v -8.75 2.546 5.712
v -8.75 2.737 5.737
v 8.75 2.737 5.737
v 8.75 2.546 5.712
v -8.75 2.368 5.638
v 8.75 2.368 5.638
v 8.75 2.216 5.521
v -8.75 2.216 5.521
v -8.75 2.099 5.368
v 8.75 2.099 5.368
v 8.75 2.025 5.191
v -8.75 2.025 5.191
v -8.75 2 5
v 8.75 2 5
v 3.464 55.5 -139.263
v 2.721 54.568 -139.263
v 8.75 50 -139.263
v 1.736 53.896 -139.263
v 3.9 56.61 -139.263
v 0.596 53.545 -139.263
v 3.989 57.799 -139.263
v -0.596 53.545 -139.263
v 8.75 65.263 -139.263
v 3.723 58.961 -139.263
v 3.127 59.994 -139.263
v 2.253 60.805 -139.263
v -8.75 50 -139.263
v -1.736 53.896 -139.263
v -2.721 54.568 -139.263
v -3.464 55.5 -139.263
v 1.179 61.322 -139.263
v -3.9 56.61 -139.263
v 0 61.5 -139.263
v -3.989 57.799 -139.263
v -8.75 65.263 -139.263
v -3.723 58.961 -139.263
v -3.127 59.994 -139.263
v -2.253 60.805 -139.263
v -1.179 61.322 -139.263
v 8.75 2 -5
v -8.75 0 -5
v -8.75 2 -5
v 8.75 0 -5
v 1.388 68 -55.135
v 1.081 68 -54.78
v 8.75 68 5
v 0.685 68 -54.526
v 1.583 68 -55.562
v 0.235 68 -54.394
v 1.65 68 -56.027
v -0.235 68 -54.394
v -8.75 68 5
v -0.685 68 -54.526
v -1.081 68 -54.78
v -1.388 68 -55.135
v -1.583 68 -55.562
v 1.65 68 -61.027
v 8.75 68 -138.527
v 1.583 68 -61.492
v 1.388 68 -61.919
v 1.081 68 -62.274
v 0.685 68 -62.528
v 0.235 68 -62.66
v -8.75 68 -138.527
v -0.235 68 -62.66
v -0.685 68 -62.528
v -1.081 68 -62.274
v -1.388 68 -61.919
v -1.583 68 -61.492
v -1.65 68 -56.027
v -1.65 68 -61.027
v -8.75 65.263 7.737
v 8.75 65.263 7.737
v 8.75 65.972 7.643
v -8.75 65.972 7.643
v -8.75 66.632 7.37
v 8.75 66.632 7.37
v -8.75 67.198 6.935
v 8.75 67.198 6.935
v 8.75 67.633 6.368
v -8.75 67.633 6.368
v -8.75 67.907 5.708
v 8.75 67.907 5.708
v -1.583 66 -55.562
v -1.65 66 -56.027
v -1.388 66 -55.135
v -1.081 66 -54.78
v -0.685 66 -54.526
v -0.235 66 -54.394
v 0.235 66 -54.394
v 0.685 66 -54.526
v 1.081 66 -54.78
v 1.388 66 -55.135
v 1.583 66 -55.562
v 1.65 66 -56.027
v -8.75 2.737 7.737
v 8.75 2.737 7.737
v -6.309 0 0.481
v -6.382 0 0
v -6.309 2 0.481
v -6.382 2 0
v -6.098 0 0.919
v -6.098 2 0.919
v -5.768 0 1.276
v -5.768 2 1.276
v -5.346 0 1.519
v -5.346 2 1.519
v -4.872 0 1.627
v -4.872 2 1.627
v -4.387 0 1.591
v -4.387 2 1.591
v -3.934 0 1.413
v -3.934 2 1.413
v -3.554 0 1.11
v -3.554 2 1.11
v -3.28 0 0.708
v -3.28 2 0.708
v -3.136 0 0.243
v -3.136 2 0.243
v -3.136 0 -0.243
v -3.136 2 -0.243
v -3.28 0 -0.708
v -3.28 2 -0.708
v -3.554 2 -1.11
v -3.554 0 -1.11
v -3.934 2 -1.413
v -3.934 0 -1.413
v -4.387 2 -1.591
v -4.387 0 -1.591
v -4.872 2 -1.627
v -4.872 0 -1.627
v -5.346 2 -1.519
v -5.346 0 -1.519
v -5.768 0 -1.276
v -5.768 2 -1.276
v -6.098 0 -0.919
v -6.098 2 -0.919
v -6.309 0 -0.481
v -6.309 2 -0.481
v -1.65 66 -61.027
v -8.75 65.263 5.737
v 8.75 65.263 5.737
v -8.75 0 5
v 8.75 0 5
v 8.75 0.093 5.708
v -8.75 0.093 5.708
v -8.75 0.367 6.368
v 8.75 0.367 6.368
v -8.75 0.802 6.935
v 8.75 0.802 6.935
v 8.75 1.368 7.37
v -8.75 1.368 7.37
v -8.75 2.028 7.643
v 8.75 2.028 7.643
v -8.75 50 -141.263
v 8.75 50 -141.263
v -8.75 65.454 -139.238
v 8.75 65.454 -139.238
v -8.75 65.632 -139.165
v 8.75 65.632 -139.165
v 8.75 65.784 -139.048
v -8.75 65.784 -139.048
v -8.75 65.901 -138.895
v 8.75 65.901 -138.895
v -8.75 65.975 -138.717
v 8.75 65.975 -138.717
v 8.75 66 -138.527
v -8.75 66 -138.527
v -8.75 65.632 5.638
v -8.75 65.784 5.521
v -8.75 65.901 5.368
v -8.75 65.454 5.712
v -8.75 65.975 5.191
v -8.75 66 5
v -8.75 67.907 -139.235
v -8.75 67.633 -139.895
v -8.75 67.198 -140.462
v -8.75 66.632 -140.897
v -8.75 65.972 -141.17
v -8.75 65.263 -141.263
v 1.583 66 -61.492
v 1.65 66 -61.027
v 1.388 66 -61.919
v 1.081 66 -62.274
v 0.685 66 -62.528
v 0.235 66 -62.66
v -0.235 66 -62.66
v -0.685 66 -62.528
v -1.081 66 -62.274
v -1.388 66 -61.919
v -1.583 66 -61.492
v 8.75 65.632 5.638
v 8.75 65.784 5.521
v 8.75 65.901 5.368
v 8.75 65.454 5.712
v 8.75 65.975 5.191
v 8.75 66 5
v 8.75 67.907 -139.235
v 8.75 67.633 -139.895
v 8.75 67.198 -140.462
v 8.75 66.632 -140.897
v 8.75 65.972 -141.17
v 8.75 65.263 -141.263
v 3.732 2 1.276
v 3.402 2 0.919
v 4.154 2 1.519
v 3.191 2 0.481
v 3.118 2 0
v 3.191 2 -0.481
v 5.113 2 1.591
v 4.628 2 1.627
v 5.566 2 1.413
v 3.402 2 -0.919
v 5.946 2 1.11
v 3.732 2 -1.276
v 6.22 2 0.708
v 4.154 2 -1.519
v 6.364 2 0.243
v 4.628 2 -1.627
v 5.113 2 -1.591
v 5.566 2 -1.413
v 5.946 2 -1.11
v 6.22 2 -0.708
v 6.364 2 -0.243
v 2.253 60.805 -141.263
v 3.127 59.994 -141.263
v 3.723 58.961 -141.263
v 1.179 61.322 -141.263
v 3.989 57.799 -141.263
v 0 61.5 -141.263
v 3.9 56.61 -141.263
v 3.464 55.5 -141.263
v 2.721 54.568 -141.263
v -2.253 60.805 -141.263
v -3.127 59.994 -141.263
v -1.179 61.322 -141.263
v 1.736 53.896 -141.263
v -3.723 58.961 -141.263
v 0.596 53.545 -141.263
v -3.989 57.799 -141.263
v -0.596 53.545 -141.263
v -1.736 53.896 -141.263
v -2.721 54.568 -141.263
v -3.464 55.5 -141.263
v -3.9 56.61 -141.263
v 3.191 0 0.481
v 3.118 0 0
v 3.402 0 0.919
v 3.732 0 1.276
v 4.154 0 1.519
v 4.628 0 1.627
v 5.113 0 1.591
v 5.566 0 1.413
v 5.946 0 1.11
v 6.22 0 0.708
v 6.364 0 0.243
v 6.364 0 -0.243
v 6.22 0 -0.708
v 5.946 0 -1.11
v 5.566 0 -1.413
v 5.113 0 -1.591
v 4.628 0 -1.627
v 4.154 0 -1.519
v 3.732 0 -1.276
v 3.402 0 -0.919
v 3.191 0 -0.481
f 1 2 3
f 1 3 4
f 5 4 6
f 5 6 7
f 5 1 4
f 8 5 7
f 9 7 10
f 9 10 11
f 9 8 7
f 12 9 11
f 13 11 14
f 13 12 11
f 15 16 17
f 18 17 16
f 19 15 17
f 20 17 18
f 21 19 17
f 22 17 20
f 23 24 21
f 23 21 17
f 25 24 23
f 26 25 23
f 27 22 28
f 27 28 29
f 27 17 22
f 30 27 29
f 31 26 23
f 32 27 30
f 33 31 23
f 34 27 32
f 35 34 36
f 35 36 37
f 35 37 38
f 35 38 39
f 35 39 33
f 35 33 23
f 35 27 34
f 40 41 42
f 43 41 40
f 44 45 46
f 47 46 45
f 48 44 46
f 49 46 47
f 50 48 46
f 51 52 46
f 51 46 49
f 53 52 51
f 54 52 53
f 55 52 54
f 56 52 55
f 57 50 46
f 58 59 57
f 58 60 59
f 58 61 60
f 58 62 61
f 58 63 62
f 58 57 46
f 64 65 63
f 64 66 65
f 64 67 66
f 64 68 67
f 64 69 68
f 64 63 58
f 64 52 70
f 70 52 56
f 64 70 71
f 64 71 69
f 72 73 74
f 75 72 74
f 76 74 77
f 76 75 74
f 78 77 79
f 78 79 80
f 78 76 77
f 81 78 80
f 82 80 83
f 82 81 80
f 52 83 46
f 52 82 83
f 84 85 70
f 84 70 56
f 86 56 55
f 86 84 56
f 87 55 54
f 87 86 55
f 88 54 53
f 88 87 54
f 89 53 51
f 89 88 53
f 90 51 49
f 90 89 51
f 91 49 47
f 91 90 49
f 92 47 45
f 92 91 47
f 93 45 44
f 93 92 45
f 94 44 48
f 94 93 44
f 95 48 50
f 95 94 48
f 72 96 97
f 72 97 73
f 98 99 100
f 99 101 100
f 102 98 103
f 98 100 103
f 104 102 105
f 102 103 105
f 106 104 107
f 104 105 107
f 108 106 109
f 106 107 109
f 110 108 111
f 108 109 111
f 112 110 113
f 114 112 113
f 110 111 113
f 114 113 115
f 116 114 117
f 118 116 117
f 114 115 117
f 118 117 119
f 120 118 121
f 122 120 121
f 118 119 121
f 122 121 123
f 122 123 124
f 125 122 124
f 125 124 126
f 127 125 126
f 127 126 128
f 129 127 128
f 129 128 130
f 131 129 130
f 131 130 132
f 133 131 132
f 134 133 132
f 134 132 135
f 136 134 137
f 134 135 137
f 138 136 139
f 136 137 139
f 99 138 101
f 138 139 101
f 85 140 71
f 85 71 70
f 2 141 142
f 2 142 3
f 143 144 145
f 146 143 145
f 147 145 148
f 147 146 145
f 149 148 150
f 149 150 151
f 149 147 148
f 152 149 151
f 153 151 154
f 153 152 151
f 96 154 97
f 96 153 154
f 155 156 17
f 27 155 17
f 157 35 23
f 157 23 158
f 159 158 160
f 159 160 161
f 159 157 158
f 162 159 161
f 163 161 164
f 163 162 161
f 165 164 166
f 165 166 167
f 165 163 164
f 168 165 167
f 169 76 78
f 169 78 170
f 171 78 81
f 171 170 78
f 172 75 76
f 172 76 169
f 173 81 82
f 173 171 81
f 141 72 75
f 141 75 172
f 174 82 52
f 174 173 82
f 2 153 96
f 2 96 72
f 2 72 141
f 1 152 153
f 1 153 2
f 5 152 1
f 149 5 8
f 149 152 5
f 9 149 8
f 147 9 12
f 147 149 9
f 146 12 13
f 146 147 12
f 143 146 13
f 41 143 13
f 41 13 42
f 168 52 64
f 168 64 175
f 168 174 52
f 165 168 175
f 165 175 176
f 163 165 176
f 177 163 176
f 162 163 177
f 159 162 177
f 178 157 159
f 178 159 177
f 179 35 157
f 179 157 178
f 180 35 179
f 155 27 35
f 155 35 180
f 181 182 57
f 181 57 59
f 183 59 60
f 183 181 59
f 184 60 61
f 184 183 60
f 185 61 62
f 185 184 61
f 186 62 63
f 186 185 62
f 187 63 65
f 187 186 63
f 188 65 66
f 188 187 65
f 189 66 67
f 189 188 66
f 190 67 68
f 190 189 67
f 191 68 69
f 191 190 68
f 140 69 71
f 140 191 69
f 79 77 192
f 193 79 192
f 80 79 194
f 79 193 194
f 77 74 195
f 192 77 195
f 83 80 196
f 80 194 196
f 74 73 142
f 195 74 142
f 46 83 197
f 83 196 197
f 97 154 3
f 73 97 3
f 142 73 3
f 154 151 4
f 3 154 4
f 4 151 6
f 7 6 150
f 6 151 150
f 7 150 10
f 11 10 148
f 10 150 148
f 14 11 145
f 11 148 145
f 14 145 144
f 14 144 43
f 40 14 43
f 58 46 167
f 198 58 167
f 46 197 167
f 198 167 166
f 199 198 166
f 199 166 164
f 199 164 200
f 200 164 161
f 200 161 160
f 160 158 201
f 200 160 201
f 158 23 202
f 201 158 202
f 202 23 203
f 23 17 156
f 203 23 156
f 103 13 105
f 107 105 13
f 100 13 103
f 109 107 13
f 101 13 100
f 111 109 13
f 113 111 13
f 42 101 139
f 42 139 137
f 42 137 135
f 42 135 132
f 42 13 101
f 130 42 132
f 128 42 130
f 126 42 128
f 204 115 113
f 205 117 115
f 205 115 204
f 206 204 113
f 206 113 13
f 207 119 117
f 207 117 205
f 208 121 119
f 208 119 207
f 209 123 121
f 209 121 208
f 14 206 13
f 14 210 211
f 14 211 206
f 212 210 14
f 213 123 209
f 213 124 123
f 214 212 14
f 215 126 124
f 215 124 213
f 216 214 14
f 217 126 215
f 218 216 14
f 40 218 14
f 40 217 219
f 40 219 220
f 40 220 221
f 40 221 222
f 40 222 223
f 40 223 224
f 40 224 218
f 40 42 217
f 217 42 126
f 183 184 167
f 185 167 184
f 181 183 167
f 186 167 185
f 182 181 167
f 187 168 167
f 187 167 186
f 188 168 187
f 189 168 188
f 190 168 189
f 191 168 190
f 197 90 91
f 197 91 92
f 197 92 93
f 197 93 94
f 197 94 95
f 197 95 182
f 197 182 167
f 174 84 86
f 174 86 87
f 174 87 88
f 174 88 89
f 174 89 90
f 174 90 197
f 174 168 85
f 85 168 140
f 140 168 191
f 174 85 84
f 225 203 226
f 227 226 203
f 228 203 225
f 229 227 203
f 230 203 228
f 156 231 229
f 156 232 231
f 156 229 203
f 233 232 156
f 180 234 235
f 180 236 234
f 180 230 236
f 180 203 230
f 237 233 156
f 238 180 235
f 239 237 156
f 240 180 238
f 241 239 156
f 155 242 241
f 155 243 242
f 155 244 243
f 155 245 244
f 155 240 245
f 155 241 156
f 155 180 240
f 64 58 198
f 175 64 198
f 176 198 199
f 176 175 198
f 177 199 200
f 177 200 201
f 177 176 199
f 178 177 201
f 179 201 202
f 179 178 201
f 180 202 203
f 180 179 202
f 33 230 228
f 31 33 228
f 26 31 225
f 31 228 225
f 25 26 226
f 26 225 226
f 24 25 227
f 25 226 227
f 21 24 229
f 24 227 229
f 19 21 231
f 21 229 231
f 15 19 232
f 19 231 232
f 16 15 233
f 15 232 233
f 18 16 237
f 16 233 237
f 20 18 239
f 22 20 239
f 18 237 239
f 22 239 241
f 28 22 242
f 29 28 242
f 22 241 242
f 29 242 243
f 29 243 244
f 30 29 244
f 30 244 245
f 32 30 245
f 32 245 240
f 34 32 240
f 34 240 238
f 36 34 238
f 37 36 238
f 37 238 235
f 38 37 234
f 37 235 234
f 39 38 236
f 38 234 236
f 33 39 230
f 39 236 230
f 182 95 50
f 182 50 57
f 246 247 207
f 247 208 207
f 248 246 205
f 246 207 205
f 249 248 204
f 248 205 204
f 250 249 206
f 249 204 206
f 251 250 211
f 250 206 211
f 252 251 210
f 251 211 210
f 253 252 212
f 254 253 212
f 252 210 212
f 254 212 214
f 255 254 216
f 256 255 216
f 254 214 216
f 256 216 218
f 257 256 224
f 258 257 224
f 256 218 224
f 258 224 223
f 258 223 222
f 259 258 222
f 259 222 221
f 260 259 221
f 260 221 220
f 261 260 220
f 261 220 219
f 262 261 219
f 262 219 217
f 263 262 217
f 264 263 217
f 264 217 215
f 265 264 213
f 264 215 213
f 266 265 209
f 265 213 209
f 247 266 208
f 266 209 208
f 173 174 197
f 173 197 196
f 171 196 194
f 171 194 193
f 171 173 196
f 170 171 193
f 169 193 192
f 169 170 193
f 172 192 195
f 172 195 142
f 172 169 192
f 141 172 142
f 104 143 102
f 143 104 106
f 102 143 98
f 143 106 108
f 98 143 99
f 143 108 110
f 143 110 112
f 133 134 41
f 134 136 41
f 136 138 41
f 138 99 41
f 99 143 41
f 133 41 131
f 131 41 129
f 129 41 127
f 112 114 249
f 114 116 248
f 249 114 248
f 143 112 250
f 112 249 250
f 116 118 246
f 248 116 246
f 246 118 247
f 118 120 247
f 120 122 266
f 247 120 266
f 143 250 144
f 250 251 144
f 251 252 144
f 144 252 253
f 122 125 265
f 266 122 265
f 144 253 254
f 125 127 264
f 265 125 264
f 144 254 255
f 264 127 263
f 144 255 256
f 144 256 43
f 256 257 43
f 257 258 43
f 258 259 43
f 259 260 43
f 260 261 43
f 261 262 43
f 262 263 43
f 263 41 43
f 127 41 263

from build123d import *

# Parameters (mm, degrees)
SKETCH1_W                    = 17.5
SKETCH1_H                    = 10
BASE_FLANGE1_DEPTH           = 2
EDGE_FLANGE1_DEPTH           = 17.5
EDGE_FLANGE2_STRIP_W         = 9.4732
EDGE_FLANGE2_STRIP_H         = 2
EDGE_FLANGE2_STRIP_CUT_DEPTH = 17.5
EDGE_FLANGE2_DEPTH           = 17.5
EDGE_FLANGE3_STRIP_W         = 9.4732
EDGE_FLANGE3_STRIP_H         = 2
EDGE_FLANGE3_STRIP_CUT_DEPTH = 17.5
EDGE_FLANGE3_DEPTH           = 17.5
SKETCH18_R                   = 4
CUT_EXTRUDE2_DEPTH           = 2
F_4_CLEARANCE_HOLE1_D        = 3.2639
F_4_CLEARANCE_HOLE1_DEPTH    = 2
F_4_CLEARANCE_HOLE1_TIP      = 0.980574487
CUT_EXTRUDE3_DEPTH           = 2


# Sheet-metal steps are written as plain solids
with BuildPart() as part:
    # Sketch1 → Base-Flange1 (new body)
    with BuildSketch(Plane(origin=(0, 0, 0), x_dir=(1, 0, 0), z_dir=(0, 1, 0))):
        Rectangle(SKETCH1_W, SKETCH1_H)
    extrude(amount=BASE_FLANGE1_DEPTH)

    # Edge-Flange1 section (across the edge) → Edge-Flange1 (add)
    with BuildSketch(Plane(origin=(-8.75, 2, 5.7366), x_dir=(0, 0, -1), z_dir=(1, 0, 0))):
        with BuildLine():
            Line((-2, 0.7366), (-2, 66))
            Line((-2, 66), (0, 66))
            Line((0, 66), (0, 0.7366))
            ThreePointArc((0, 0.7366), (0.215745145, 0.215745145), (0.7366, 0))
            Line((0.7366, 0), (0.7366, -2))
            ThreePointArc((0.7366, -2), (-1.198468417, -1.198468417), (-2, 0.7366))
        make_face()
    extrude(amount=EDGE_FLANGE1_DEPTH)

    # Edge-Flange2 strip (across the edge) → Edge-Flange2 strip cut (cut)
    with BuildSketch(Plane(origin=(-8.75, 68, 5.7366), x_dir=(0, -1, 0), z_dir=(1, 0, 0))):
        with Locations((-2, -1)):
            Rectangle(EDGE_FLANGE2_STRIP_W, EDGE_FLANGE2_STRIP_H)
    extrude(amount=EDGE_FLANGE2_STRIP_CUT_DEPTH, mode=Mode.SUBTRACT)

    # Edge-Flange2 section (across the edge) → Edge-Flange2 (add)
    with BuildSketch(Plane(origin=(-8.75, 68, 5.7366), x_dir=(0, -1, 0), z_dir=(1, 0, 0))):
        with BuildLine():
            Line((0, 0.7366), (0, 147))
            Line((0, 147), (2, 147))
            Line((2, 147), (2, 0.7366))
            ThreePointArc((2, 0.7366), (2.215745145, 0.215745145), (2.7366, 0))
            Line((2.7366, 0), (2.7366, -2))
            ThreePointArc((2.7366, -2), (0.801531583, -1.198468417), (0, 0.7366))
        make_face()
    extrude(amount=EDGE_FLANGE2_DEPTH)

    # Edge-Flange3 strip (across the edge) → Edge-Flange3 strip cut (cut)
    with BuildSketch(Plane(origin=(-8.75, 66, -141.2634), x_dir=(0, 0, 1), z_dir=(1, 0, 0))):
        with Locations((-2, -1)):
            Rectangle(EDGE_FLANGE3_STRIP_W, EDGE_FLANGE3_STRIP_H)
    extrude(amount=EDGE_FLANGE3_STRIP_CUT_DEPTH, mode=Mode.SUBTRACT)

    # Edge-Flange3 section (across the edge) → Edge-Flange3 (add)
    with BuildSketch(Plane(origin=(-8.75, 66, -141.2634), x_dir=(0, 0, 1), z_dir=(1, 0, 0))):
        with BuildLine():
            Line((0, 0.7366), (0, 16))
            Line((0, 16), (2, 16))
            Line((2, 16), (2, 0.7366))
            ThreePointArc((2, 0.7366), (2.215745145, 0.215745145), (2.7366, 0))
            Line((2.7366, 0), (2.7366, -2))
            ThreePointArc((2.7366, -2), (0.801531583, -1.198468417), (0, 0.7366))
        make_face()
    extrude(amount=EDGE_FLANGE3_DEPTH)

    # Sketch18 → Cut-Extrude2 (cut)
    with BuildSketch(Plane(origin=(0, 0, -141.2634), x_dir=(-1, 0, 0), z_dir=(0, 0, -1))):
        with Locations(Location((0, 57.5, 0), (0, 0, 90))):
            Circle(SKETCH18_R)
    extrude(amount=-CUT_EXTRUDE2_DEPTH, mode=Mode.SUBTRACT)

    # #4 Clearance Hole1
    with Locations(Plane.XZ):
        with Locations((4.75, 0), (-4.75, 0)):
            Hole(F_4_CLEARANCE_HOLE1_D / 2, depth=F_4_CLEARANCE_HOLE1_DEPTH)
            with Locations((0, 0, -(F_4_CLEARANCE_HOLE1_DEPTH + F_4_CLEARANCE_HOLE1_TIP / 2))):  # 118° drill point
                Cone(0, F_4_CLEARANCE_HOLE1_D / 2, F_4_CLEARANCE_HOLE1_TIP, mode=Mode.SUBTRACT)

    # Sketch23 → Cut-Extrude3 (cut)
    with BuildSketch(Plane.XZ.offset(-66)):
        with BuildLine():
            Line((-1.65, -61.0268), (-1.65, -56.0268))
            ThreePointArc((-1.65, -56.0268), (0, -54.3768), (1.65, -56.0268))
            Line((1.65, -56.0268), (1.65, -61.0268))
            ThreePointArc((1.65, -61.0268), (0, -62.6768), (-1.65, -61.0268))
        make_face()
    extrude(amount=-CUT_EXTRUDE3_DEPTH, mode=Mode.SUBTRACT)


solid = part.part
